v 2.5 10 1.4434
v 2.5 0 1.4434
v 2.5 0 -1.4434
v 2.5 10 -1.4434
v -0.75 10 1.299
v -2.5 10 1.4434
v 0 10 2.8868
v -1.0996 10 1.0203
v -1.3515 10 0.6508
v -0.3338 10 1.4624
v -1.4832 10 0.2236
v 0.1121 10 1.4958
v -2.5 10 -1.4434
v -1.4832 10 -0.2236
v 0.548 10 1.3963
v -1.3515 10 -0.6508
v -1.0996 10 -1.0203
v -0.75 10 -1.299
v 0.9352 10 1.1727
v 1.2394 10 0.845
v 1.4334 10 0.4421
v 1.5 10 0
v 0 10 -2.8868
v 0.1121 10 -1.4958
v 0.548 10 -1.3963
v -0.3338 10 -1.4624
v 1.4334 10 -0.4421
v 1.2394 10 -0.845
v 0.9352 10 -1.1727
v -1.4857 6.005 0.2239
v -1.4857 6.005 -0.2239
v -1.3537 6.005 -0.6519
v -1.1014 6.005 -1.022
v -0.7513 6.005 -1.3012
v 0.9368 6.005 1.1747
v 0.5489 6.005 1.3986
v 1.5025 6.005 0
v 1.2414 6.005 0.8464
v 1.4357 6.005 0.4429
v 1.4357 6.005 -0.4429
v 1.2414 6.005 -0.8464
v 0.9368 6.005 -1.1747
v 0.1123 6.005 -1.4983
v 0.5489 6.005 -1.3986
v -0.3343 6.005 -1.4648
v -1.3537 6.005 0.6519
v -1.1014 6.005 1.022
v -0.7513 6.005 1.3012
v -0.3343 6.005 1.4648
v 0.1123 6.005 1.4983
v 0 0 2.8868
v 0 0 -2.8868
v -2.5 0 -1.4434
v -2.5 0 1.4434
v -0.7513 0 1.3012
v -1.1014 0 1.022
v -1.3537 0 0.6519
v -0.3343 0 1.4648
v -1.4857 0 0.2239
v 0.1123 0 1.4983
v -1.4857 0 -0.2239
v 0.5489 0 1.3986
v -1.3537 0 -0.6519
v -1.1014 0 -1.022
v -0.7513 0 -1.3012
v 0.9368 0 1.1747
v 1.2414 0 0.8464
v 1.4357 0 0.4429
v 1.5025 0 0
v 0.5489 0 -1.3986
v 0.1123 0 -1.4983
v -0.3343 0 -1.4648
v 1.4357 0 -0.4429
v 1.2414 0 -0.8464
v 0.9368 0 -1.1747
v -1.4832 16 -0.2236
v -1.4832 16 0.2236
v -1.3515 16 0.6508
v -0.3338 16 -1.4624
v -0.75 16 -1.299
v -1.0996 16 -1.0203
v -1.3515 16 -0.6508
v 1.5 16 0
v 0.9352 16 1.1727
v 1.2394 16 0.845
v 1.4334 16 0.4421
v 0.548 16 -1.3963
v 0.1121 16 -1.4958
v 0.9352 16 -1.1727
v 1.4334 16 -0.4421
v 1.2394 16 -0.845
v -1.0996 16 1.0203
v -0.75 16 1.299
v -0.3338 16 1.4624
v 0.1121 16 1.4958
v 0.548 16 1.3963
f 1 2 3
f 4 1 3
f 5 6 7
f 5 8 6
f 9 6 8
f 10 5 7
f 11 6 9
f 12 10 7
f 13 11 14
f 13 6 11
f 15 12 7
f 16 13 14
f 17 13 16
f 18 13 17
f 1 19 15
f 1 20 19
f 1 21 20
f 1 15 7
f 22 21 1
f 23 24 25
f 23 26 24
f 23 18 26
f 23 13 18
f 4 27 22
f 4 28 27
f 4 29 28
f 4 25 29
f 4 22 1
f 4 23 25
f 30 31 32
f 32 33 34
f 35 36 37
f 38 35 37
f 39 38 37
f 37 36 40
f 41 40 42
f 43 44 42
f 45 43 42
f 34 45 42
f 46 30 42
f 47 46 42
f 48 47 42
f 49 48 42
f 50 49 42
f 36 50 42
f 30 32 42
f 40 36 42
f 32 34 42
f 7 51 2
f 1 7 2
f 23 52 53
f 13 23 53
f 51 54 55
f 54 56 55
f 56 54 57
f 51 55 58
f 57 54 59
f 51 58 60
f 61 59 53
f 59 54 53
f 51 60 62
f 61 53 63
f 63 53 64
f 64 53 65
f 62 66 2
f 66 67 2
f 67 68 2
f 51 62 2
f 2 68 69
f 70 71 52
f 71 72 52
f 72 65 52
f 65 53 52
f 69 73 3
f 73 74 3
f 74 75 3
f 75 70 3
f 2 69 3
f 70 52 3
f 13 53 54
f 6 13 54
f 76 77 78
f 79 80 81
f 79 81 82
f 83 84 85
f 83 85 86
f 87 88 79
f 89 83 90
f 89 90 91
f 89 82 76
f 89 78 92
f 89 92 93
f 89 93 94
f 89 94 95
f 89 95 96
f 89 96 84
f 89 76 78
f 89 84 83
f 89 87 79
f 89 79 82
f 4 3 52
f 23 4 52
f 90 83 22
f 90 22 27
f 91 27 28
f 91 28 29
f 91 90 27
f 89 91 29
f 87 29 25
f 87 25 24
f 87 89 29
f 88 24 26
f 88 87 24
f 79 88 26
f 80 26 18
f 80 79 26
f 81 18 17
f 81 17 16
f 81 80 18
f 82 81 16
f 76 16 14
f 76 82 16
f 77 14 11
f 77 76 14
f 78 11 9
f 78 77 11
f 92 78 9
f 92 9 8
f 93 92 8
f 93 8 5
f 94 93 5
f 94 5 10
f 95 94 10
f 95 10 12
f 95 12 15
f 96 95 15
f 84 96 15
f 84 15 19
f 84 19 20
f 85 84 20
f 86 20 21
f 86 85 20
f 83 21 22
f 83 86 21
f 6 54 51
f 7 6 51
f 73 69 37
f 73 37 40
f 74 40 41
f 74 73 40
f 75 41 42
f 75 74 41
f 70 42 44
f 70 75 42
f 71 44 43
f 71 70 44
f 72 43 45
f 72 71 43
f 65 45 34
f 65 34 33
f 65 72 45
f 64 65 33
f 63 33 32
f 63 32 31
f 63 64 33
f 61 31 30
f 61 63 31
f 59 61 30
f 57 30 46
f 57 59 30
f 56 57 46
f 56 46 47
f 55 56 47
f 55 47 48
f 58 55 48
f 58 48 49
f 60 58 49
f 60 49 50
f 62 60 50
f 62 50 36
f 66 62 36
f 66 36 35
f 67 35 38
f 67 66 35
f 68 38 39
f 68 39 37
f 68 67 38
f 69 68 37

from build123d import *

# Parameters (mm, degrees)
BOSS_EXTRUDE1_DEPTH = 16
SKETCH2_R           = 1.5025
CUT_EXTRUDE1_DEPTH  = 6.005
SKETCH3_R           = 1.5
CUT_EXTRUDE2_DEPTH  = 6


with BuildPart() as part:
    # Sketch1 → Boss-Extrude1 (new body)
    with BuildSketch(Plane(origin=(0, 0, 0), x_dir=(1, 0, 0), z_dir=(0, 1, 0))):
        Polygon((2.5, 1.443375673), (0, 2.886751346), (-2.5, 1.443375673), (-2.5, -1.443375673), (0, -2.886751346), (2.5, -1.443375673), align=None)
    extrude(amount=BOSS_EXTRUDE1_DEPTH)

    # Sketch2 → Cut-Extrude1 (cut)
    with BuildSketch(Plane(origin=(0, 0, 0), x_dir=(1, 0, 0), z_dir=(0, 1, 0))):
        Circle(SKETCH2_R)
    extrude(amount=CUT_EXTRUDE1_DEPTH, mode=Mode.SUBTRACT)

    # Sketch3 → Cut-Extrude2 (cut)
    with BuildSketch(Plane(origin=(0, 16, 0), x_dir=(1, 0, 0), z_dir=(0, 1, 0))):
        Polygon((0, 2.886751346), (-2.5, 1.443375673), (-2.5, -1.443375673), (0, -2.886751346), (2.5, -1.443375673), (2.5, 1.443375673), align=None)
        Circle(SKETCH3_R, mode=Mode.SUBTRACT)
    extrude(amount=-CUT_EXTRUDE2_DEPTH, mode=Mode.SUBTRACT)


solid = part.part
